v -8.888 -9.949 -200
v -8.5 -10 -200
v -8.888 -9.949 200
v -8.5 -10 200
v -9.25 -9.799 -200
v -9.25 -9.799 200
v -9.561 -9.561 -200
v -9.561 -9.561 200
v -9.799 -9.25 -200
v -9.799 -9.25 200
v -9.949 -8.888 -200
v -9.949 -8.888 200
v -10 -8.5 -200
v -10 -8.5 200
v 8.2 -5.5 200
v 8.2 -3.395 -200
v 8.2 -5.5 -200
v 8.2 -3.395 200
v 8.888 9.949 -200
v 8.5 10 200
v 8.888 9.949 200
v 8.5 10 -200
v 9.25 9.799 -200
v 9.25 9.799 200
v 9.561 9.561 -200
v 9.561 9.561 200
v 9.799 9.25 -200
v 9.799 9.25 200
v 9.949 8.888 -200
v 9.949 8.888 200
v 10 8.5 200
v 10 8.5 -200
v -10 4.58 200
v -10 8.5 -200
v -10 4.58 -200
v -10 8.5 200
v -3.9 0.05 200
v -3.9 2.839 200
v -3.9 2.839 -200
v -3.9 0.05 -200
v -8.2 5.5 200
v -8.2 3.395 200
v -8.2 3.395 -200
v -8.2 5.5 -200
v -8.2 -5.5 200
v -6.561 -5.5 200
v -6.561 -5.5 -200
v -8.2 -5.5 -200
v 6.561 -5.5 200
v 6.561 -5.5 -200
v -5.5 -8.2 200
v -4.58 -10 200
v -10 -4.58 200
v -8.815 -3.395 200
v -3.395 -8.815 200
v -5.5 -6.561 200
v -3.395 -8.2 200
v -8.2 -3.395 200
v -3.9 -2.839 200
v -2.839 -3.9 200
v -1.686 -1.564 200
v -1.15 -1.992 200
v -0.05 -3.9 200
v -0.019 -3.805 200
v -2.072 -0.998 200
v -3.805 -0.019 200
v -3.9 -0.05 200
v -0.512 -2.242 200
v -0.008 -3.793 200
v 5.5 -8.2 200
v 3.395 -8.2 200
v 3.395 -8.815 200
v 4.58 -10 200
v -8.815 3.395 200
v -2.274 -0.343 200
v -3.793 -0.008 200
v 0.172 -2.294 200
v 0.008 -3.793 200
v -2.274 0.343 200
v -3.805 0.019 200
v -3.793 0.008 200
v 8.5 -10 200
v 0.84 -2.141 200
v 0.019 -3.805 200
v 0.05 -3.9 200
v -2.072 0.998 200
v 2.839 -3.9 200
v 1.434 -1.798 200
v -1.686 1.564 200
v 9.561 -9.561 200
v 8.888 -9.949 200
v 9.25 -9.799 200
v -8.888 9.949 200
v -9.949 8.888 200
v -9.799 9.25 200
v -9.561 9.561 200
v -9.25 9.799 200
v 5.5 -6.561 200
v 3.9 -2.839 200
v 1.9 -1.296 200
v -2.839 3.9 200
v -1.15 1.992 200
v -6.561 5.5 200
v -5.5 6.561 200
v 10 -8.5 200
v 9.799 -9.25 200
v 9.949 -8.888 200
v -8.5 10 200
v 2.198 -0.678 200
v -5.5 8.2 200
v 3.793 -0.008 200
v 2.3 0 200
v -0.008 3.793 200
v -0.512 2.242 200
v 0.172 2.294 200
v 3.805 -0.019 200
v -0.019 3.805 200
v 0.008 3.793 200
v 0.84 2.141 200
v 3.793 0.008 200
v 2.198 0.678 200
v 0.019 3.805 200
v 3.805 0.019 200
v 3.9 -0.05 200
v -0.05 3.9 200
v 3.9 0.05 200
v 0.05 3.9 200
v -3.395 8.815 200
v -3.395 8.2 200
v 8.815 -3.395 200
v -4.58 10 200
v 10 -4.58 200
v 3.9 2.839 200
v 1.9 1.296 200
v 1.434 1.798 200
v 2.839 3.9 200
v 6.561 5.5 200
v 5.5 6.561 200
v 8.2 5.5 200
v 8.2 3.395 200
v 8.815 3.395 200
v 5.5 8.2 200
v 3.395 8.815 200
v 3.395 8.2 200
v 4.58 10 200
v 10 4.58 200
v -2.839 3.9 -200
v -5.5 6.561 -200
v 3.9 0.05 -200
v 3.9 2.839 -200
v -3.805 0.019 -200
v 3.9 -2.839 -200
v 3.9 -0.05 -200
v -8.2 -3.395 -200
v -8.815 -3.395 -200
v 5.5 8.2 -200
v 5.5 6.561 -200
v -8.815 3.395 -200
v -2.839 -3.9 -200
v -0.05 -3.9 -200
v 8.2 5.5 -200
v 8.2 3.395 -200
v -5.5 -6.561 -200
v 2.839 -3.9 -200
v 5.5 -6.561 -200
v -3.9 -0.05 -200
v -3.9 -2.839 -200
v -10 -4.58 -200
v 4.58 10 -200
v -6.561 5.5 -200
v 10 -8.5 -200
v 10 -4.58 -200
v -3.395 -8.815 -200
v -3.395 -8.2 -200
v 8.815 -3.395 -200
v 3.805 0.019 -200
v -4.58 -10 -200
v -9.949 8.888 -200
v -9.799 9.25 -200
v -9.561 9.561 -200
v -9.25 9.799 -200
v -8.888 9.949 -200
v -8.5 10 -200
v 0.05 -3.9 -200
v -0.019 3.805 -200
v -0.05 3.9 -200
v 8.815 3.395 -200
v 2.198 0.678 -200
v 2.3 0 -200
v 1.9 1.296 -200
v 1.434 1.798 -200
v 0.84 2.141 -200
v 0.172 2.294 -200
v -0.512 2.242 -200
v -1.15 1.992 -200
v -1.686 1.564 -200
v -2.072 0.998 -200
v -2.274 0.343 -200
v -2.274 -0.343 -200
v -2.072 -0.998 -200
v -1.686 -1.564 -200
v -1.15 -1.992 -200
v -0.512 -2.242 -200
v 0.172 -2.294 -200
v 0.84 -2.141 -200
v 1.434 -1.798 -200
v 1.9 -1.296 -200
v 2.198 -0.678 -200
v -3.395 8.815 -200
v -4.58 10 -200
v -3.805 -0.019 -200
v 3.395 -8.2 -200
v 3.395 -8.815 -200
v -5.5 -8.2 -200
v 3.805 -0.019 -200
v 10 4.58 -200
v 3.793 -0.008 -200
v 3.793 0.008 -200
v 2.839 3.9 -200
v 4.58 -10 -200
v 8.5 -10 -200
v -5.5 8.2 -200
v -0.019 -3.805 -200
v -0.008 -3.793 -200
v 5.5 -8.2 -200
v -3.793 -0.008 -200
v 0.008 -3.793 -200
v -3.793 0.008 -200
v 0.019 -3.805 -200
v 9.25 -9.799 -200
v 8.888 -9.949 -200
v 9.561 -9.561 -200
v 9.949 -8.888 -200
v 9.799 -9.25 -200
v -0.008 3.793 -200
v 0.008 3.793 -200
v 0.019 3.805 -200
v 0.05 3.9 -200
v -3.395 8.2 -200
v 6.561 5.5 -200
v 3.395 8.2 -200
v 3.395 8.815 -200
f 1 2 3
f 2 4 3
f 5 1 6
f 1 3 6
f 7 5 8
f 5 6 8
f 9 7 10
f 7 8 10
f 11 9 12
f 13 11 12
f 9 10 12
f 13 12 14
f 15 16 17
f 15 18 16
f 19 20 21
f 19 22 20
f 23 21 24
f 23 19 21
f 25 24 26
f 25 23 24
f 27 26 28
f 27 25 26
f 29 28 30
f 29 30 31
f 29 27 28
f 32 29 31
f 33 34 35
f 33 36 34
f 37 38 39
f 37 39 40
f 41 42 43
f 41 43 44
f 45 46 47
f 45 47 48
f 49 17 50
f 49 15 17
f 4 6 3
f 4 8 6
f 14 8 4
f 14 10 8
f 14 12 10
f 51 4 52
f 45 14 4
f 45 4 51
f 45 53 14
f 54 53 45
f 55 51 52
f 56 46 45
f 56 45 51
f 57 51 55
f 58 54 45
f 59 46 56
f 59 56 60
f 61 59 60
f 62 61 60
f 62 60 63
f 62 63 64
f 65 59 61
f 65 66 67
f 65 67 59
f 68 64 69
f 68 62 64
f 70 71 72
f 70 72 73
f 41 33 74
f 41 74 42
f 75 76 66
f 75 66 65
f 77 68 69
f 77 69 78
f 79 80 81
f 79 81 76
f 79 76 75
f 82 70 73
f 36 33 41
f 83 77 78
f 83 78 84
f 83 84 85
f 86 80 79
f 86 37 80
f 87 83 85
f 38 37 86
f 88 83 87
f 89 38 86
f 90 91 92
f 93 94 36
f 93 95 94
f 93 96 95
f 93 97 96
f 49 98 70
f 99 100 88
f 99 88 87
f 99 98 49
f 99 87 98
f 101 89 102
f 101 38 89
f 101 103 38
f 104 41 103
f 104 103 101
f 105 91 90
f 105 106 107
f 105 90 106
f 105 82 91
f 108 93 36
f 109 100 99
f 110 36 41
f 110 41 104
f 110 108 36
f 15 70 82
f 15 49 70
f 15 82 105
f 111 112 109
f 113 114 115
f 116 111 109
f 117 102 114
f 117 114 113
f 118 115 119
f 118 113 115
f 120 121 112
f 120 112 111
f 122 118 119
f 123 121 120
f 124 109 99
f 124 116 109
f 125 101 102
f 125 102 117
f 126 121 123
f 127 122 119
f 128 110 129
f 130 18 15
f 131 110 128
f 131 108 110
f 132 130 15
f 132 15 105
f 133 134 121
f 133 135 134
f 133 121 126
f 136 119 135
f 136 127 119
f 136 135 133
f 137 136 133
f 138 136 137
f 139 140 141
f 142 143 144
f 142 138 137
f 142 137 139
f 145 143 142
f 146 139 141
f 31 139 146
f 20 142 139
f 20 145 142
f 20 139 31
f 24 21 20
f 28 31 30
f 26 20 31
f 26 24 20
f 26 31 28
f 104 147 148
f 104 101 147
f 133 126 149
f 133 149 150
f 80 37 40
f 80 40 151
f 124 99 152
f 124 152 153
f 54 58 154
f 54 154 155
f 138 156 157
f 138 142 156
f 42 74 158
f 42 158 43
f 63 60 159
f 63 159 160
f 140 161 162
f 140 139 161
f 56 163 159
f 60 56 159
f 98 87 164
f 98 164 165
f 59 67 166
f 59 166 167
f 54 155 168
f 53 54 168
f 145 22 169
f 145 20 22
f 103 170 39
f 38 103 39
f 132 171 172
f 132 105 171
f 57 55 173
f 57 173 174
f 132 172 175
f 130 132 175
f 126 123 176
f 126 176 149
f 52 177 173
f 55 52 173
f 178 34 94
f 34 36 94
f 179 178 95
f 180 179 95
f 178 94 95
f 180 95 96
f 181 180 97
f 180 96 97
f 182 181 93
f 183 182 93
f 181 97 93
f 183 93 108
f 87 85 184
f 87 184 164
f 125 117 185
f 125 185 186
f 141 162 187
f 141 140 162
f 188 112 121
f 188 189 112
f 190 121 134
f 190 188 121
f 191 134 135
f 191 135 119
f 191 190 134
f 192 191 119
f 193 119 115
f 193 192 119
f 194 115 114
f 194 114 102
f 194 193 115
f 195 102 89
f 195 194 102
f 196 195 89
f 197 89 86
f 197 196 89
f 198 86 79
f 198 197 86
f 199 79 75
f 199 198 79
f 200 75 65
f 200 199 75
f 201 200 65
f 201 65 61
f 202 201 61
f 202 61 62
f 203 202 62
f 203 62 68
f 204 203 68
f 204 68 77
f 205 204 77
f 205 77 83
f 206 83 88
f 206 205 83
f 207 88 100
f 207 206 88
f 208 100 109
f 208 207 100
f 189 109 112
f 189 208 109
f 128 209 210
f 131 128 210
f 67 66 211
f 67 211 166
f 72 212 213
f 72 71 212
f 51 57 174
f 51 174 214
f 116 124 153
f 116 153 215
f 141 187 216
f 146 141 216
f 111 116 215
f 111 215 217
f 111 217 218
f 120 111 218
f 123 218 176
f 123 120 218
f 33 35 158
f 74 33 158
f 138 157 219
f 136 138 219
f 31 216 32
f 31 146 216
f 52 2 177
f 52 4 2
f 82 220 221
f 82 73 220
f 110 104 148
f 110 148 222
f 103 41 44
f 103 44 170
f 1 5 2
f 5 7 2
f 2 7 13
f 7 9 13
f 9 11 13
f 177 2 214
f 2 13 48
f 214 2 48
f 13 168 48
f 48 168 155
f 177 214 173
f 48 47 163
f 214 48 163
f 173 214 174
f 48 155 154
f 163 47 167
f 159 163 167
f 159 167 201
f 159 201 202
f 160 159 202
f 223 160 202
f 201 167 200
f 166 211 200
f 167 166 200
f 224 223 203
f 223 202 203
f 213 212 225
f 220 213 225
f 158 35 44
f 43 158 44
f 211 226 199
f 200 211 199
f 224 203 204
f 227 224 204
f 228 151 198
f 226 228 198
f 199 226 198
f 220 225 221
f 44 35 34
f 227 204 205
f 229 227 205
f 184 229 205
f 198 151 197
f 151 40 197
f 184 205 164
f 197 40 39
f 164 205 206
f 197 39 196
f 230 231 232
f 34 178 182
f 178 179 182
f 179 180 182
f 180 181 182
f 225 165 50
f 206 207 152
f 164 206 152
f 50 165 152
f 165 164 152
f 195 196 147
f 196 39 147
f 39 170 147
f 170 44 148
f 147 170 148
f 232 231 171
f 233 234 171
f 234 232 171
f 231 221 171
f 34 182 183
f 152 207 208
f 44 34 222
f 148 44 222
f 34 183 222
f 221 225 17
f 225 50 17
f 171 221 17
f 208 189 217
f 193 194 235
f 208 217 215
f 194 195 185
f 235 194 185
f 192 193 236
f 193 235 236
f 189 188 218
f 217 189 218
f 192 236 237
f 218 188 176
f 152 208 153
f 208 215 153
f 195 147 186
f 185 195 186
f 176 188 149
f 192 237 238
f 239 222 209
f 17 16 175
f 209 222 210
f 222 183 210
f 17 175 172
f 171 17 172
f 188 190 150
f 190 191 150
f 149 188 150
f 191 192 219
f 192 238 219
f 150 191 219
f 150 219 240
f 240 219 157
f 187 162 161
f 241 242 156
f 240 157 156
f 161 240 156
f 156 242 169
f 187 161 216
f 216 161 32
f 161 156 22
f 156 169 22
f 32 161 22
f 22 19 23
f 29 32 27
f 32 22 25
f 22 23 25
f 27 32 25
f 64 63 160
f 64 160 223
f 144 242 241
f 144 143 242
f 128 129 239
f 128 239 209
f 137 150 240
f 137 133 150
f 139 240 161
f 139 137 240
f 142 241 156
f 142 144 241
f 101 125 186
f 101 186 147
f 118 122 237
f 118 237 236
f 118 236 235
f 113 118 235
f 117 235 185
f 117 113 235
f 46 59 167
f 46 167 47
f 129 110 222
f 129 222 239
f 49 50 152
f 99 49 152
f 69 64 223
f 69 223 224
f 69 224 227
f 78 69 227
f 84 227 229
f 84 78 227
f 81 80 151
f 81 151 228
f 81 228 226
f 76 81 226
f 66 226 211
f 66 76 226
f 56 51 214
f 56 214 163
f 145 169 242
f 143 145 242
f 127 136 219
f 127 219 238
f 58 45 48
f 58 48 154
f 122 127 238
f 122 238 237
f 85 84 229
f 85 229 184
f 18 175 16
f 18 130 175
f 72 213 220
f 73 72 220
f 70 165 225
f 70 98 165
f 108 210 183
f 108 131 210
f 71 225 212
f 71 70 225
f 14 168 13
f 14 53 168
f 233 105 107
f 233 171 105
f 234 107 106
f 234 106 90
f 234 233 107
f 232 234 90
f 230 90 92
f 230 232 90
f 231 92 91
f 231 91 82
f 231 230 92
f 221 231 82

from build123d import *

# Parameters (mm, degrees)
SKETCH1_R           = 2.3
BOSS_EXTRUDE1_DEPTH = 200
CUT_EXTRUDE1_DEPTH  = 400
CIRPATTERN1_COUNT   = 4
FILLET1_R           = 1.5


with BuildPart() as part:
    # Sketch1 → Boss-Extrude1 (new, symmetric)
    with BuildSketch(Plane.XY):
        Polygon((-2.839339828, 3.9), (-5.5, 6.560660172), (-5.5, 8.2), (-3.395, 8.2), (-3.395, 8.815), (-4.58, 10), (-10, 10), (-10, 4.58), (-8.815, 3.395), (-8.2, 3.395), (-8.2, 5.5), (-6.560660172, 5.5), (-3.9, 2.839339828), (-3.9, 0), (-3.9, -2.839339828), (-6.560660172, -5.5), (-8.2, -5.5), (-8.2, -3.395), (-8.815, -3.395), (-10, -4.58), (-10, -10), (-4.58, -10), (-3.395, -8.815), (-3.395, -8.2), (-5.5, -8.2), (-5.5, -6.560660172), (-2.839339828, -3.9), (0, -3.9), (2.839339828, -3.9), (5.5, -6.560660172), (5.5, -8.2), (3.395, -8.2), (3.395, -8.815), (4.58, -10), (10, -10), (10, -4.58), (8.815, -3.395), (8.2, -3.395), (8.2, -5.5), (6.560660172, -5.5), (3.9, -2.839339828), (3.9, 0), (3.9, 2.839339828), (6.560660172, 5.5), (8.2, 5.5), (8.2, 3.395), (8.815, 3.395), (10, 4.58), (10, 10), (4.58, 10), (3.395, 8.815), (3.395, 8.2), (5.5, 8.2), (5.5, 6.560660172), (2.839339828, 3.9), (0, 3.9), align=None)
        Circle(SKETCH1_R, mode=Mode.SUBTRACT)
    extrude(amount=BOSS_EXTRUDE1_DEPTH, both=True)

    # Sketch2 → Cut-Extrude1 (cut)
    with BuildSketch(Plane.XY.offset(200)):
        with BuildLine():
            Line((-0.019015758, 3.804921208), (-0.05, 3.9))
            Line((-0.05, 3.9), (0.05, 3.9))
            Line((0.05, 3.9), (0.019015758, 3.804921208))
            ThreePointArc((0.019015758, 3.804921208), (0, 3.791118056), (-0.019015758, 3.804921208))
        make_face()
    cut_extrude1 = extrude(amount=-CUT_EXTRUDE1_DEPTH, mode=Mode.SUBTRACT)

    # CirPattern1: Cut-Extrude1 ×4 about axis
    cirpattern1_axis = Axis((0, 0, 0), (0, 0, 1))
    for i in range(1, CIRPATTERN1_COUNT):
        add(cut_extrude1.rotate(cirpattern1_axis, i * 360 / CIRPATTERN1_COUNT), mode=Mode.SUBTRACT)

    # Fillet1
    fillet1_edges = [part.edges().sort_by_distance(p)[0] for p in [
        (10, 10, 0),
        (10, -10, 0),
        (-10, -10, 0),
        (-10, 10, 0),
    ]]
    fillet(fillet1_edges, radius=FILLET1_R)


solid = part.part
